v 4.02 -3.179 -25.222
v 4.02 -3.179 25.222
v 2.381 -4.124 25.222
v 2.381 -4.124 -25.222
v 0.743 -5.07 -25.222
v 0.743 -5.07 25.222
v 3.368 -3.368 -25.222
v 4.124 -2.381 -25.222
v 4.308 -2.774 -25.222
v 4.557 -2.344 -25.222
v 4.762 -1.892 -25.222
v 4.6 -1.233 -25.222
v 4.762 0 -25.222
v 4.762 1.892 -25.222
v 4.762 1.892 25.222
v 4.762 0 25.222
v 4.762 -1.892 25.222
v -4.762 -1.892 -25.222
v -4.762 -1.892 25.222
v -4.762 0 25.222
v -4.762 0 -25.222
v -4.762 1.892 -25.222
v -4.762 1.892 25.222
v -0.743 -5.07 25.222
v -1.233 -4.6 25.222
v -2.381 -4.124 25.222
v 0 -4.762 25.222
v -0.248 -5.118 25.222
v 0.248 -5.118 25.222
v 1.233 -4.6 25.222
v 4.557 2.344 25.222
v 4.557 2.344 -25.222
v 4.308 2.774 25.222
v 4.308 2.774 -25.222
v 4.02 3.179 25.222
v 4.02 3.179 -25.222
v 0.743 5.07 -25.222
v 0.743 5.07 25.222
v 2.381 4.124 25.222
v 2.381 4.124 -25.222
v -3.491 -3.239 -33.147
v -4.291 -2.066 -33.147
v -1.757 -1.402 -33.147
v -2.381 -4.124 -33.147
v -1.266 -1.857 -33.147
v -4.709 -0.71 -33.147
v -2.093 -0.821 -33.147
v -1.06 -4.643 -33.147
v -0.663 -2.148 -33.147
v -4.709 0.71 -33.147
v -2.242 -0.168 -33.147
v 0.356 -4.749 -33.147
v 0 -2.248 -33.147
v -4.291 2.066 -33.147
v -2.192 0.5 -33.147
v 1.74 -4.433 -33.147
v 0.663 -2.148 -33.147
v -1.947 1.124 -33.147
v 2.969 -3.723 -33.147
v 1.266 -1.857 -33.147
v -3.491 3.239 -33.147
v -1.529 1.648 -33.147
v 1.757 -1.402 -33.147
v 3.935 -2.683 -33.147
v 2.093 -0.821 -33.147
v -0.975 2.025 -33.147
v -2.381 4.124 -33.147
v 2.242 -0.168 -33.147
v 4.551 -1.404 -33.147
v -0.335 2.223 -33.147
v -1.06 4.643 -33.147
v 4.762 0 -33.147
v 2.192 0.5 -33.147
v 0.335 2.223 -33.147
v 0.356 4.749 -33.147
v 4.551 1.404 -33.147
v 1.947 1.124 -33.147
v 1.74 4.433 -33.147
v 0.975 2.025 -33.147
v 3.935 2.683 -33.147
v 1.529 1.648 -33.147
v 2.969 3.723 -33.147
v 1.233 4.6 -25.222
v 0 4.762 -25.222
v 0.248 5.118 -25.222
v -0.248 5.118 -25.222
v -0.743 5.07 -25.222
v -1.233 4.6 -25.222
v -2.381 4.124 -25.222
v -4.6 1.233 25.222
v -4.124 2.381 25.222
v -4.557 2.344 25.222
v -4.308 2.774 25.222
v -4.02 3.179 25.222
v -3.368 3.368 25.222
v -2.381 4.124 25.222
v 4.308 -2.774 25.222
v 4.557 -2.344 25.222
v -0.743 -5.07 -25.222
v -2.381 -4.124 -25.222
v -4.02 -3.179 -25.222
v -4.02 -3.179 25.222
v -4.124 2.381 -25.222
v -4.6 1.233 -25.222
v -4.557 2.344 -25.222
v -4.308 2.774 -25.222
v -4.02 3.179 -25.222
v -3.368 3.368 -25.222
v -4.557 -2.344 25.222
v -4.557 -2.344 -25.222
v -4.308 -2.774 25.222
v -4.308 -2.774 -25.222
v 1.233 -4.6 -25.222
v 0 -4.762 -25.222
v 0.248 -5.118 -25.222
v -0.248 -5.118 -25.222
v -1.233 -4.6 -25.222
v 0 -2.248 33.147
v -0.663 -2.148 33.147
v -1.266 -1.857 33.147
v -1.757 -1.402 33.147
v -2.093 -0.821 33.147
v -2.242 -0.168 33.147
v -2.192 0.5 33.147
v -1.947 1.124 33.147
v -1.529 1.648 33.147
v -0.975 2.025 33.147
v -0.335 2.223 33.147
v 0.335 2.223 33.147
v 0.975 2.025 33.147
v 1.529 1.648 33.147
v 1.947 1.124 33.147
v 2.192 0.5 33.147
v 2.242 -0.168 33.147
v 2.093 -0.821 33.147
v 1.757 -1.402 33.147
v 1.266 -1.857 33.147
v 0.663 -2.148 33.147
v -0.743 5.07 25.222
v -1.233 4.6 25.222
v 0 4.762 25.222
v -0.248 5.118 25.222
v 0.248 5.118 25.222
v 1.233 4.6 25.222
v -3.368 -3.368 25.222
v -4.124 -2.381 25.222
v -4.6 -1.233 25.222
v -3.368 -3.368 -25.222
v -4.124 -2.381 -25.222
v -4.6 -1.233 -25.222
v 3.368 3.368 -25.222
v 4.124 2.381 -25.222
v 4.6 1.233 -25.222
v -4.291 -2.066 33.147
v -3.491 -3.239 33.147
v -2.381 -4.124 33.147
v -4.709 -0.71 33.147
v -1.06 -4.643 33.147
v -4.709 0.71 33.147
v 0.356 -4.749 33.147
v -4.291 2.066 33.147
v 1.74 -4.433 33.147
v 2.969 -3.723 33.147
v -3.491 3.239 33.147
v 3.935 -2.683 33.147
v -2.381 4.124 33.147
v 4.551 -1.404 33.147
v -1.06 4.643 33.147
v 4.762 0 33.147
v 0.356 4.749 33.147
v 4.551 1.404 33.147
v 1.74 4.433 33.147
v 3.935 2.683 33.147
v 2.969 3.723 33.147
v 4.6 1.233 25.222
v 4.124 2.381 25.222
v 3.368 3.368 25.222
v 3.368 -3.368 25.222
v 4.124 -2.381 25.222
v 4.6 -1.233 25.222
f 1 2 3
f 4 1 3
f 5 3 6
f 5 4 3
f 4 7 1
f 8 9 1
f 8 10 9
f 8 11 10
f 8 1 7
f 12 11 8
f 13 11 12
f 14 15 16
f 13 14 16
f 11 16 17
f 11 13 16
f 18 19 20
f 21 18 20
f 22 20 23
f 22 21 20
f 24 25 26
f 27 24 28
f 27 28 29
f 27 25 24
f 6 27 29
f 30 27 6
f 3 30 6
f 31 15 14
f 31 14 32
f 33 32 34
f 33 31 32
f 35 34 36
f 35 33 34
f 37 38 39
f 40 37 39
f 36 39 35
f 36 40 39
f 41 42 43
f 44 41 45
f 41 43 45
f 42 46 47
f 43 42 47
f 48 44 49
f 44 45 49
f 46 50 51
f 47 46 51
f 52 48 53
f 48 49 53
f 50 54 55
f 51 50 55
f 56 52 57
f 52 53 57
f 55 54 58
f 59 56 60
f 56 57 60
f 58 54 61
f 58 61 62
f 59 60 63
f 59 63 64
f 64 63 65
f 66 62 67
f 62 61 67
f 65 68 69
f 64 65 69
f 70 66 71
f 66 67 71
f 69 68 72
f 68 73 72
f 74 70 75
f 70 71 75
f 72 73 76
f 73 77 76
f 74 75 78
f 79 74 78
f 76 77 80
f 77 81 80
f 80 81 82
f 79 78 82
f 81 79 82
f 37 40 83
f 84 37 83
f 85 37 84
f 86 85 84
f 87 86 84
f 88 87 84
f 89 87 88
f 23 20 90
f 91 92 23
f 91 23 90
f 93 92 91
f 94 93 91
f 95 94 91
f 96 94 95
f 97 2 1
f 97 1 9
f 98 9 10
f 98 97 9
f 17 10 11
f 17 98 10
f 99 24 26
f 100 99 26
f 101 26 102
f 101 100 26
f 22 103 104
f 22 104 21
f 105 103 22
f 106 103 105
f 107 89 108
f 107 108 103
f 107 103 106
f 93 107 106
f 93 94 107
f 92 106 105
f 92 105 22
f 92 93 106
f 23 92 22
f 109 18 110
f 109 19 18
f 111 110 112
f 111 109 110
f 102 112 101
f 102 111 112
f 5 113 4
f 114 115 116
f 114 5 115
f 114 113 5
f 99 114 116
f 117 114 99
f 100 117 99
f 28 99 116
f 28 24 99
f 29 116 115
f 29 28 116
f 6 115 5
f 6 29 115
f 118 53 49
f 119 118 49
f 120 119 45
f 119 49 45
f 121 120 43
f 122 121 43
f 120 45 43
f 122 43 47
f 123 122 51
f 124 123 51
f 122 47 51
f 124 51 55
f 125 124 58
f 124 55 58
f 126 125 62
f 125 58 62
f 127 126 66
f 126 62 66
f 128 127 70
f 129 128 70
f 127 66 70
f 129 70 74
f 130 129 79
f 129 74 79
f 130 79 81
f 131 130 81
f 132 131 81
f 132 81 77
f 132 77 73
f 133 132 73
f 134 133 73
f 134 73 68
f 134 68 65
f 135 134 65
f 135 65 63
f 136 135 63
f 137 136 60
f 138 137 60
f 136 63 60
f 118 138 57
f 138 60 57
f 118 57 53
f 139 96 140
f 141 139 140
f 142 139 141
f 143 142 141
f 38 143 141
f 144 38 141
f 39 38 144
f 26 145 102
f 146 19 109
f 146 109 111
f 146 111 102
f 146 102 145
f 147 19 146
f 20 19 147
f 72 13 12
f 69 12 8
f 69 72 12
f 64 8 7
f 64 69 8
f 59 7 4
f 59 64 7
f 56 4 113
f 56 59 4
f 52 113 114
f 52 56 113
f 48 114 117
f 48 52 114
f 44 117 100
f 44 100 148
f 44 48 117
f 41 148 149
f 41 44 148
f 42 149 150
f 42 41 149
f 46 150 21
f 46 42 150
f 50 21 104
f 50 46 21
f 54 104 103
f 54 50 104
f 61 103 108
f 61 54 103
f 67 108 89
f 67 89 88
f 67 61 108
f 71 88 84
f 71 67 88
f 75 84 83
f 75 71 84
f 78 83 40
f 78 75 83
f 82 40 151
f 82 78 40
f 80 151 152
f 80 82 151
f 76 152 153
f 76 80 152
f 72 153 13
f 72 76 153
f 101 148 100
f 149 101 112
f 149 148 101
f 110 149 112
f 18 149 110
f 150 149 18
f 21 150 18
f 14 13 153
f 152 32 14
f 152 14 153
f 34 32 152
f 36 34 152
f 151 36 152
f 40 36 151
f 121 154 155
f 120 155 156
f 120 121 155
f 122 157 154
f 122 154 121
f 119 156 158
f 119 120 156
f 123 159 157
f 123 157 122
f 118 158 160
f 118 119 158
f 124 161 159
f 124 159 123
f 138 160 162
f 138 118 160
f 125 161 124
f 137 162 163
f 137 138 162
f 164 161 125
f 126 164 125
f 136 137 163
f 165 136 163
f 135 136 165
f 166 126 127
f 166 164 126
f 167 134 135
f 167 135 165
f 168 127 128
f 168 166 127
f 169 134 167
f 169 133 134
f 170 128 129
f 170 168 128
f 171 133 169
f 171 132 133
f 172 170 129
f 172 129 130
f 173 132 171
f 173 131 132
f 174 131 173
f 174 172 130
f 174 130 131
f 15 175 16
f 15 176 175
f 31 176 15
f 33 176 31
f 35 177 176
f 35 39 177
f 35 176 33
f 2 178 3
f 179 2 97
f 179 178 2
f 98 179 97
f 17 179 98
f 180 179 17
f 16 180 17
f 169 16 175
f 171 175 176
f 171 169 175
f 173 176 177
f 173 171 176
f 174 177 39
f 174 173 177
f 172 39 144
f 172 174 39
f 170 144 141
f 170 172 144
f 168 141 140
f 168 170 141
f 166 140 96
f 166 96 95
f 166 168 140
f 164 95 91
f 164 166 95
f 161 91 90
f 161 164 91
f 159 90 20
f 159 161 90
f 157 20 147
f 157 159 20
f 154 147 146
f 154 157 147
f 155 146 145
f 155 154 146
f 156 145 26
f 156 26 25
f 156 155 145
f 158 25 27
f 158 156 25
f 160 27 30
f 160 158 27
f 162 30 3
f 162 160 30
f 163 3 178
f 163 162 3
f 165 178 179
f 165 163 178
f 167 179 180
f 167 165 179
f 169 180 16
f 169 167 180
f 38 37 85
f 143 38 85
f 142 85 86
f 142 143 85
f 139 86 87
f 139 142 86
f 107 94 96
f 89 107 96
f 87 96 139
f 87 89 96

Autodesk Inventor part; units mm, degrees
ref_plane "YZ Plane" through (0, 0, 0) normal (1, 0, 0) x (0, 1, 0)
ref_plane "XZ Plane" through (0, 0, 0) normal (0, 1, 0) x (-1, 0, 0)
ref_plane "XY Plane" through (0, 0, 0) normal (0, 0, 1) x (1, 0, 0)
sketch "Sketch1" plane through (0, 0, 0) normal (0, 0, 1) x (1, 0, 0)
  line L0 (-4.7625, -2.7496) -> (-4.7625, 2.7496)
  line L1 (-4.7625, 2.7496) -> (0, 5.4993)
  line L2 (0, 5.4993) -> (4.7625, 2.7496)
  line L3 (4.7625, 2.7496) -> (4.7625, -2.7496)
  line L4 (4.7625, -2.7496) -> (0, -5.4993)
  line L5 (0, -5.4993) -> (-4.7625, -2.7496)
  point P0 (0, 0)
  point P1 (0, 0)
  dimension "Size" = 9.525
extrude "Extrusion1" add sketch "Sketch1" along normal mid plane 66.294
sketch "Sketch3" plane through (0, 0, 33.147) normal (0, 0, 1) x (1, 0, 0)
  line L0 (-4.7625, 2.7496) -> (0, 5.4993) construction
  line L1 (0, 5.4993) -> (4.7625, 2.7496) construction
  line L2 (4.7625, 2.7496) -> (4.7625, -2.7496) construction
  line L3 (4.7625, -2.7496) -> (0, -5.4993) construction
  line L4 (0, -5.4993) -> (-4.7625, -2.7496) construction
  line L5 (-4.7625, -2.7496) -> (-4.7625, 2.7496) construction
  point P0 (0, 0)
hole "Hole1" at (0, 0, 33.147) direction (0, 0, -1) diameter 4.4958 end through all
sketch "Sketch4" plane through (0, 0, 33.147) normal (0, 0, 1) x (1, 0, 0)
  circle A0 centre (0, 0) radius 2.2479 construction
  line L0 (-4.7625, 2.7496) -> (0, 5.4993) construction
  line L1 (0, 5.4993) -> (4.7625, 2.7496) construction
  line L2 (4.7625, 2.7496) -> (4.7625, -2.7496) construction
  line L3 (4.7625, -2.7496) -> (0, -5.4993) construction
  line L4 (0, -5.4993) -> (-4.7625, -2.7496) construction
  line L5 (-4.7625, -2.7496) -> (-4.7625, 2.7496) construction
  circle A1 centre (0, 0) radius 5.1245
  circle A2 centre (0, 0) radius 8.89
  dimension "thunder" = 10.2489
  dimension "d16" = 17.78
extrude "Extrusion3" cut sketch "Sketch4" against normal through all
sketch "Sketch5" plane through (0, 0, 33.147) normal (0, 0, 1) x (1, 0, 0)
  circle A0 centre (0, 0) radius 2.2479 projected
  circle A1 centre (0, 0) radius 4.7625
  line L0 (4.7625, -1.8917) -> (4.7625, 1.8917) projected
  line L1 (4.0195, 3.1786) -> (0.743, 5.0703) projected
  line L2 (-0.743, 5.0703) -> (-4.0195, 3.1786) projected
  line L3 (-4.7625, 1.8917) -> (-4.7625, -1.8917) projected
  line L4 (-4.0195, -3.1786) -> (-0.743, -5.0703) projected
  line L5 (0.743, -5.0703) -> (4.0195, -3.1786) projected
  circle A2 centre (0, 0) radius 2.2479 projected
  arc A3 (4.0195, -3.1786) -> (4.7625, -1.8917) centre (0, 0) ccw projected
  arc A4 (4.7625, 1.8917) -> (4.0195, 3.1786) centre (0, 0) ccw projected
  arc A5 (0.743, 5.0703) -> (-0.743, 5.0703) centre (0, 0) ccw projected
  arc A6 (-4.0195, 3.1786) -> (-4.7625, 1.8917) centre (0, 0) ccw projected
  arc A7 (-4.7625, -1.8917) -> (-4.0195, -3.1786) centre (0, 0) ccw projected
  arc A8 (-0.743, -5.0703) -> (0.743, -5.0703) centre (0, 0) ccw projected
  point P0 (2.3813, -4.1244)
  point P1 (-2.3813, -4.1244)
  point P2 (-4.7625, 0)
  point P3 (-2.3813, 4.1244)
  point P4 (2.3812, 4.1244)
  point P5 (4.7625, 0)
  dimension "d21" = 9.525
extrude "Extrusion4" cut sketch "Sketch5" against normal blind 7.9248 contours L0 A3 L5 A1 | A1 L1 A4 L0 | A1 L2 A5 L1 | L5 A8 L4 A1 | A1 L3 A6 L2 | L4 A7 L3 A1
mirror "Mirror2" about plane through (0, 0, 0) normal (0, 0, 1) of "Extrusion4"
equation "\"bearing\" = 25.4"
properties part number "GP9-008" material "Aluminum 6061"
